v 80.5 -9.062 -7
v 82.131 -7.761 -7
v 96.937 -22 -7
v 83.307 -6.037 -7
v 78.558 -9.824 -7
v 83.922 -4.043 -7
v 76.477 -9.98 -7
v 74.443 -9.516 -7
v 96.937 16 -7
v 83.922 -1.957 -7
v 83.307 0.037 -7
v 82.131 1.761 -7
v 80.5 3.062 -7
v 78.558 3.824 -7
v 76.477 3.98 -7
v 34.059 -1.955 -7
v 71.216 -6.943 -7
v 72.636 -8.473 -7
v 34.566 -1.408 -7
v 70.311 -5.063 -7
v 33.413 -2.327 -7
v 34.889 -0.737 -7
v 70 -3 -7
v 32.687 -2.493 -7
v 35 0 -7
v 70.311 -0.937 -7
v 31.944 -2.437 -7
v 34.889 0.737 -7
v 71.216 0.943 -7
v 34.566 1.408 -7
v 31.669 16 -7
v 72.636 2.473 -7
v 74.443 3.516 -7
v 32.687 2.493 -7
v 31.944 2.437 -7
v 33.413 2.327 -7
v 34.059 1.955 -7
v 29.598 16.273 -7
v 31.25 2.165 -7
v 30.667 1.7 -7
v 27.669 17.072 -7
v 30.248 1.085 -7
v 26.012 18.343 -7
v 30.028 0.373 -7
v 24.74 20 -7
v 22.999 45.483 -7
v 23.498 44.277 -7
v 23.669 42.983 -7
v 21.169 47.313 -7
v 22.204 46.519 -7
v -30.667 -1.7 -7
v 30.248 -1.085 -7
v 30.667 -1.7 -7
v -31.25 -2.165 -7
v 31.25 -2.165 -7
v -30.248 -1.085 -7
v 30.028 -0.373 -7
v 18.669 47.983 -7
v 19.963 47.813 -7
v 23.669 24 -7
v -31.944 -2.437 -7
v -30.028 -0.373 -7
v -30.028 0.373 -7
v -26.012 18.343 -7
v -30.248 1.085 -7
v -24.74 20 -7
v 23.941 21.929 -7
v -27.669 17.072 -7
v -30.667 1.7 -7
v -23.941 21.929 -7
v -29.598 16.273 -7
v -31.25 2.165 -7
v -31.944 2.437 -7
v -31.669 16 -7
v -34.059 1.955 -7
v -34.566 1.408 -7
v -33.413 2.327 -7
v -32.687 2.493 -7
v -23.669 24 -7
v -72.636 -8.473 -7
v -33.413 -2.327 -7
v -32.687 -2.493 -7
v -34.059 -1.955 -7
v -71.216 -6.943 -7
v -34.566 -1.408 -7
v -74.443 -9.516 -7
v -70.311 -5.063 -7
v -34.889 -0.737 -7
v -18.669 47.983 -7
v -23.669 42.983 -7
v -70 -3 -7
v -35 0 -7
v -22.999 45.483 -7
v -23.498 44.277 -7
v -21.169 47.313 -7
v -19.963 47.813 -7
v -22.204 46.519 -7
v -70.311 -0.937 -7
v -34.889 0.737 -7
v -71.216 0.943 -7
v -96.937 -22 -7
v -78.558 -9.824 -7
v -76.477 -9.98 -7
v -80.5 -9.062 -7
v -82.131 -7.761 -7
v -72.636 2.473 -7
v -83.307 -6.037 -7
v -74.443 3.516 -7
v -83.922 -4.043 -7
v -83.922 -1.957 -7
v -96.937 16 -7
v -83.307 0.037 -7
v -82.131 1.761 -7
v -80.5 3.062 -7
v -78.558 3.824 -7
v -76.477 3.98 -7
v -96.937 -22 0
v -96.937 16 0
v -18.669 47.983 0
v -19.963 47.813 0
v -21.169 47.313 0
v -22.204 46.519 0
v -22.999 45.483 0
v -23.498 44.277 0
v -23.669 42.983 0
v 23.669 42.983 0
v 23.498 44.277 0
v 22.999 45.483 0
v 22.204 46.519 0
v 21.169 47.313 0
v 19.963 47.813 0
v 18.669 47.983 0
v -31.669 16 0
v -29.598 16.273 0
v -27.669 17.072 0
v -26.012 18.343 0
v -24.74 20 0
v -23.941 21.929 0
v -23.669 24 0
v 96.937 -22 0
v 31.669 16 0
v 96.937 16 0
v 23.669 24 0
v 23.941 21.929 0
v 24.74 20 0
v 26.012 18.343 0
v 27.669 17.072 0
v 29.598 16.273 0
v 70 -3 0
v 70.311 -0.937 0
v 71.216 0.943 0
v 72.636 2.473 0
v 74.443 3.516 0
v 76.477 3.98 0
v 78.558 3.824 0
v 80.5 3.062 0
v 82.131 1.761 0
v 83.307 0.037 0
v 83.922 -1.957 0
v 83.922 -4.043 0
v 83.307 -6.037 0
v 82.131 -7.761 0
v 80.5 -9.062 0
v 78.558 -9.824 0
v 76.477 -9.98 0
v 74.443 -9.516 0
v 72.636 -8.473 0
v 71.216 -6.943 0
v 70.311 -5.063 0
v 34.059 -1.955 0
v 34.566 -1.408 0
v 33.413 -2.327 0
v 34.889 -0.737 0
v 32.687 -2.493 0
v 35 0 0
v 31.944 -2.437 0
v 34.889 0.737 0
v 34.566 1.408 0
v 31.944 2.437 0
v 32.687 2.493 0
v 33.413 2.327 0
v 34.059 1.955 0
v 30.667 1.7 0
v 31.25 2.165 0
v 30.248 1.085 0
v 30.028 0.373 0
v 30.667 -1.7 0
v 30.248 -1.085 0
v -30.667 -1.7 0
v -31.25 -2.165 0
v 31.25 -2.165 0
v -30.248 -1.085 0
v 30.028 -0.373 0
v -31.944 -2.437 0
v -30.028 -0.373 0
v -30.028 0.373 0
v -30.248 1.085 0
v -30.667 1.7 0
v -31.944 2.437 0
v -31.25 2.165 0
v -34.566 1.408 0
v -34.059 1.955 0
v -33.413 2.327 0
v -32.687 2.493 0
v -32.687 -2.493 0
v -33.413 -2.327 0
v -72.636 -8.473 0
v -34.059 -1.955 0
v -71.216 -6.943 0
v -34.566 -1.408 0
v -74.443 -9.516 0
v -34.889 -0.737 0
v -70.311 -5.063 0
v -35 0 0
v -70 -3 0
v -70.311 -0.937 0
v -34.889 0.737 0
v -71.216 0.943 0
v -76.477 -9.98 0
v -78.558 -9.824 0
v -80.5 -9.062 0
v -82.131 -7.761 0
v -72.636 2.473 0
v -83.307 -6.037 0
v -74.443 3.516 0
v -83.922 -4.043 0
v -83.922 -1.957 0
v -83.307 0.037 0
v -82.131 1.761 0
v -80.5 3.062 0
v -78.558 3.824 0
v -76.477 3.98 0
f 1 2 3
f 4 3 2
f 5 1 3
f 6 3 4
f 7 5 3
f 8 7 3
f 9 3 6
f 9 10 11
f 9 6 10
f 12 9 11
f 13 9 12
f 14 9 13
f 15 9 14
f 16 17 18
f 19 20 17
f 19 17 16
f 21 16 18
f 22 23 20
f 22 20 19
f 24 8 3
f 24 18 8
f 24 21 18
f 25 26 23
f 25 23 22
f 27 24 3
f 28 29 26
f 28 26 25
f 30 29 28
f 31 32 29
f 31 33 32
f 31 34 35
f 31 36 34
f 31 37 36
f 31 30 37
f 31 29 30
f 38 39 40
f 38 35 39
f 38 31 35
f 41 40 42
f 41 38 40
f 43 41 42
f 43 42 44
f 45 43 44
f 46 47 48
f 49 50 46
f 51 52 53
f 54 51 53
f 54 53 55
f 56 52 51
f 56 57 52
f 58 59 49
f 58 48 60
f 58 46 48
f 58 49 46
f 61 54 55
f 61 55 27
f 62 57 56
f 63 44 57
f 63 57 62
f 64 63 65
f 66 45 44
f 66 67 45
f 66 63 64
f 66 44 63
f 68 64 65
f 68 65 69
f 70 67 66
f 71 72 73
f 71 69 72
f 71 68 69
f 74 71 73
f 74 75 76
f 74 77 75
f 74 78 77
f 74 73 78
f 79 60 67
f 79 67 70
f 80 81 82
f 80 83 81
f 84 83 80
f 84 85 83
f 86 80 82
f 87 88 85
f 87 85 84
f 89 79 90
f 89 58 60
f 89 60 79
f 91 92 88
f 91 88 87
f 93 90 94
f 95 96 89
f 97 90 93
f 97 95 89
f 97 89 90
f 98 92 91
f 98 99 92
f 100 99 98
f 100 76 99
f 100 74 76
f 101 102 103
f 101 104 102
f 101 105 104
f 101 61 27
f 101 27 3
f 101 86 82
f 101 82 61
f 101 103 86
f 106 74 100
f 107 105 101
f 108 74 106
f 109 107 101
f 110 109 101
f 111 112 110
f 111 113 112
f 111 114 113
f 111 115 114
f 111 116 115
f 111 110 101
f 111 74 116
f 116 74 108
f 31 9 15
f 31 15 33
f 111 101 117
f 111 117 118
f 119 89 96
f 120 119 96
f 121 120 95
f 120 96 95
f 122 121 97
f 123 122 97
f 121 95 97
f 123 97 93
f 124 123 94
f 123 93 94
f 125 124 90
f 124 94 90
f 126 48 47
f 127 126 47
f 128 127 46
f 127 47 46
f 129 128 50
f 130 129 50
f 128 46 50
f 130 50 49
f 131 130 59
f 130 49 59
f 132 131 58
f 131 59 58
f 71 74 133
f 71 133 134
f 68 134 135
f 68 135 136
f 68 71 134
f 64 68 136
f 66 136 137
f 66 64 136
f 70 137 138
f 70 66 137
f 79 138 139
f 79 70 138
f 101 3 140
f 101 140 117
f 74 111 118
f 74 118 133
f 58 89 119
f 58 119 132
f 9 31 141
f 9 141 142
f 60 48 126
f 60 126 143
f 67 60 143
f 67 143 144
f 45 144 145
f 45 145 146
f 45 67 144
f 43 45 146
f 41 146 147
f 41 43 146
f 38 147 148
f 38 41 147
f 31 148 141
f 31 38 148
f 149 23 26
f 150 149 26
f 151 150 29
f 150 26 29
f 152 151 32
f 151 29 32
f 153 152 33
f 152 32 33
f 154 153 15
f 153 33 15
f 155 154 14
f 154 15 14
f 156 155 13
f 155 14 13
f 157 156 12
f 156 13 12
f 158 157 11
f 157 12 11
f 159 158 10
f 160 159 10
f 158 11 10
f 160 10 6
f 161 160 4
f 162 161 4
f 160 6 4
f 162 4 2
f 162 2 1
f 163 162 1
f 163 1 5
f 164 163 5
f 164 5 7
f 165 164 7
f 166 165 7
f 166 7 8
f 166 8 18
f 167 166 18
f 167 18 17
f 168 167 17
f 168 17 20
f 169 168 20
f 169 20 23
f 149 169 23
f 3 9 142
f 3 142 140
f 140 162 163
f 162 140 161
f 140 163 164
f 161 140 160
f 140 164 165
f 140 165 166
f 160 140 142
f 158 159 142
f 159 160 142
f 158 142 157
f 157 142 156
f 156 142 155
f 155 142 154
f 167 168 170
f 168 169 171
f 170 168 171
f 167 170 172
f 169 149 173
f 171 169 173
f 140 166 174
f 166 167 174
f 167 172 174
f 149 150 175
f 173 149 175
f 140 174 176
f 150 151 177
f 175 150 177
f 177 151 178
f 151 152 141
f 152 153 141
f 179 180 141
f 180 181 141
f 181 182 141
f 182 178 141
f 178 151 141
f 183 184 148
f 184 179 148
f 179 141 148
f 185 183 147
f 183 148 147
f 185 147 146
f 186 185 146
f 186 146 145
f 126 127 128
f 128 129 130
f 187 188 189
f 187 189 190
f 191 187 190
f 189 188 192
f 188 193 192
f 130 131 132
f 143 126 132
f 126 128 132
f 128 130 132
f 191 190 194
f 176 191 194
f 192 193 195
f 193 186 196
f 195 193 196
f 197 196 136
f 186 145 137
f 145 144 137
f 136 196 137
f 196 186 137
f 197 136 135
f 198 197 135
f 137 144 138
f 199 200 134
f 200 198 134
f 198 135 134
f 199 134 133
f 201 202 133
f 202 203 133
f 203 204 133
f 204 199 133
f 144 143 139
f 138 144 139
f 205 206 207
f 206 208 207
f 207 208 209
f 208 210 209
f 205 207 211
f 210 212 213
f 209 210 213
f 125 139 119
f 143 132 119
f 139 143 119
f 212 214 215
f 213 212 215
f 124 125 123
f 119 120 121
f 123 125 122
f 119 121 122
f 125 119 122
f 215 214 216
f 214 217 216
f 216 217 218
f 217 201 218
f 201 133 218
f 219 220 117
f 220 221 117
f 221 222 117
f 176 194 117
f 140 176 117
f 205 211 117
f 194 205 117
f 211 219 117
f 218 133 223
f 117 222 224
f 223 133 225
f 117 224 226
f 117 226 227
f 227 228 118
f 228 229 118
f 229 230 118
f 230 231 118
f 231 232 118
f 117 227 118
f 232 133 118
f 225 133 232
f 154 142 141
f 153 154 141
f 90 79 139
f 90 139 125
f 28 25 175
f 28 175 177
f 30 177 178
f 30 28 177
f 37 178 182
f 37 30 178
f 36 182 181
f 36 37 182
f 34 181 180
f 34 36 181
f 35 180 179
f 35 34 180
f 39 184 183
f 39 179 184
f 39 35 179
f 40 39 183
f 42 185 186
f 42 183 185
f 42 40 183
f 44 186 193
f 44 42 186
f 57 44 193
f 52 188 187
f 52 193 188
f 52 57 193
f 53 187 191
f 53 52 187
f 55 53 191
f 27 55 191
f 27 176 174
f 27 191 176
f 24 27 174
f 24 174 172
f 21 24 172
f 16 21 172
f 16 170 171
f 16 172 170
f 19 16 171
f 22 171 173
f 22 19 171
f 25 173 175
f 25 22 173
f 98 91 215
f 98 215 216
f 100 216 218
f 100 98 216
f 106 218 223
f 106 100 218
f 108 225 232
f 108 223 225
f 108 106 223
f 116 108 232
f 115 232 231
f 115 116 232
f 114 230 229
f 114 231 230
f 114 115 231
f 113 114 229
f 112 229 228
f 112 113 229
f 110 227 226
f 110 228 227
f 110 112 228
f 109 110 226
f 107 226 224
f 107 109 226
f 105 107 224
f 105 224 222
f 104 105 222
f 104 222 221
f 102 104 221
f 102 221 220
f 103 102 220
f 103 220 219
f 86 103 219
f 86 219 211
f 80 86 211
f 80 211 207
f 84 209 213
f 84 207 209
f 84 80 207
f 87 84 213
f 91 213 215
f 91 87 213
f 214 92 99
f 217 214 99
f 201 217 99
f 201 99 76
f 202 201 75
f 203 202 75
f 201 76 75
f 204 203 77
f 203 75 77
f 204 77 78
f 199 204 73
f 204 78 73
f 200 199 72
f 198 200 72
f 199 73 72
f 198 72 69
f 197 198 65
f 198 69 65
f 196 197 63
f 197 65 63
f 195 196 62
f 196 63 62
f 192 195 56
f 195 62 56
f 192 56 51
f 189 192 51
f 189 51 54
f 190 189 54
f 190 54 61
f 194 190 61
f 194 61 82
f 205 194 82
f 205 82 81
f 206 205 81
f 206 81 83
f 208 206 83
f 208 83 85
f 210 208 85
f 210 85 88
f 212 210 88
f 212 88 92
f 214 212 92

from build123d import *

# Parameters (mm, degrees)
CYLINDER005_R     = 2.5
CYLINDER005_DEPTH = 90
CYLINDER004_R     = 7
CYLINDER004_DEPTH = 150
CYLINDER003_R     = 11
CYLINDER003_DEPTH = 31
PAD010_DEPTH      = 7


with BuildPart() as vis_d:
    # Cylinder005 → Cylinder005 (new body)
    with BuildSketch(Plane(origin=(32.5, 0, -12), x_dir=(1, 0, 0), z_dir=(0, 0, 1))):
        Circle(CYLINDER005_R)
    extrude(amount=CYLINDER005_DEPTH)


with BuildPart() as vis:
    # Part__Mirroring003: instance of vis_d
    add(vis_d.part.mirror(Plane(origin=(0, 0, 0), x_dir=(0, -1, 0), z_dir=(1, 0, 0))))

    # Fusion005: union vis_d
    add(vis_d.part)


with BuildPart() as axe:
    # Cylinder004 → Cylinder004 (new body)
    with BuildSketch(Plane.XY.offset(-50)):
        Circle(CYLINDER004_R)
    extrude(amount=CYLINDER004_DEPTH)


with BuildPart() as clone_of_ball_slider:
    # Cylinder003 → Cylinder003 (new body)
    with BuildSketch(Plane.XY):
        Circle(CYLINDER003_R)
    extrude(amount=CYLINDER003_DEPTH)

    # Fusion003: union axe
    add(axe.part)


with BuildPart() as clone_of_ball_slider_1:
    # Clone017 placement: moved
    add(clone_of_ball_slider.part.moved(Location((-77, -3, 13))))


with BuildPart() as part_mirroring002:
    # Part__Mirroring002: instance of Clone of ball slider
    add(clone_of_ball_slider_1.part.mirror(Plane(origin=(0, 0, 0), x_dir=(0, -1, 0), z_dir=(1, 0, 0))))


with BuildPart() as vis_sliders:
    # Fusion004 base: copy of Clone of ball slider
    add(clone_of_ball_slider_1.part)

    # Fusion004: union Part__Mirroring002
    add(part_mirroring002.part)

    # Fusion006: union vis
    add(vis.part)


with BuildPart() as cut006006:
    # Sketch → Pad010 (new body)
    with BuildSketch(Plane.XY.offset(25)):
        with BuildLine():
            Line((96.936684, 16), (96.936684, -22))
            Line((96.936684, -22), (-96.936684, -22))
            Line((-96.936684, -22), (-96.936684, 16))
            Line((-96.936684, 16), (-31.668603, 16))
            ThreePointArc((-31.668603, 16), (-26.011749, 18.343146), (-23.668603, 24))
            Line((-23.668603, 24), (-23.668603, 42.983311))
            ThreePointArc((-18.668603, 47.983311), (-22.204137, 46.518845), (-23.668603, 42.983311))
            Line((-18.668603, 47.983311), (18.668603, 47.983311))
            ThreePointArc((23.668603, 42.983311), (22.204137, 46.518845), (18.668603, 47.983311))
            Line((23.668603, 42.983311), (23.668603, 24))
            ThreePointArc((23.668603, 24), (26.011749, 18.343146), (31.668603, 16))
            Line((31.668603, 16), (96.936684, 16))
        make_face()
    extrude(amount=PAD010_DEPTH)


with BuildPart() as cut006006_1:
    # Clone016 placement: moved
    add(cut006006.part.moved(Location((0, 0, -32))))

    # Cut006006: cut vis sliders
    add(vis_sliders.part, mode=Mode.SUBTRACT)


solid = cut006006_1.part
